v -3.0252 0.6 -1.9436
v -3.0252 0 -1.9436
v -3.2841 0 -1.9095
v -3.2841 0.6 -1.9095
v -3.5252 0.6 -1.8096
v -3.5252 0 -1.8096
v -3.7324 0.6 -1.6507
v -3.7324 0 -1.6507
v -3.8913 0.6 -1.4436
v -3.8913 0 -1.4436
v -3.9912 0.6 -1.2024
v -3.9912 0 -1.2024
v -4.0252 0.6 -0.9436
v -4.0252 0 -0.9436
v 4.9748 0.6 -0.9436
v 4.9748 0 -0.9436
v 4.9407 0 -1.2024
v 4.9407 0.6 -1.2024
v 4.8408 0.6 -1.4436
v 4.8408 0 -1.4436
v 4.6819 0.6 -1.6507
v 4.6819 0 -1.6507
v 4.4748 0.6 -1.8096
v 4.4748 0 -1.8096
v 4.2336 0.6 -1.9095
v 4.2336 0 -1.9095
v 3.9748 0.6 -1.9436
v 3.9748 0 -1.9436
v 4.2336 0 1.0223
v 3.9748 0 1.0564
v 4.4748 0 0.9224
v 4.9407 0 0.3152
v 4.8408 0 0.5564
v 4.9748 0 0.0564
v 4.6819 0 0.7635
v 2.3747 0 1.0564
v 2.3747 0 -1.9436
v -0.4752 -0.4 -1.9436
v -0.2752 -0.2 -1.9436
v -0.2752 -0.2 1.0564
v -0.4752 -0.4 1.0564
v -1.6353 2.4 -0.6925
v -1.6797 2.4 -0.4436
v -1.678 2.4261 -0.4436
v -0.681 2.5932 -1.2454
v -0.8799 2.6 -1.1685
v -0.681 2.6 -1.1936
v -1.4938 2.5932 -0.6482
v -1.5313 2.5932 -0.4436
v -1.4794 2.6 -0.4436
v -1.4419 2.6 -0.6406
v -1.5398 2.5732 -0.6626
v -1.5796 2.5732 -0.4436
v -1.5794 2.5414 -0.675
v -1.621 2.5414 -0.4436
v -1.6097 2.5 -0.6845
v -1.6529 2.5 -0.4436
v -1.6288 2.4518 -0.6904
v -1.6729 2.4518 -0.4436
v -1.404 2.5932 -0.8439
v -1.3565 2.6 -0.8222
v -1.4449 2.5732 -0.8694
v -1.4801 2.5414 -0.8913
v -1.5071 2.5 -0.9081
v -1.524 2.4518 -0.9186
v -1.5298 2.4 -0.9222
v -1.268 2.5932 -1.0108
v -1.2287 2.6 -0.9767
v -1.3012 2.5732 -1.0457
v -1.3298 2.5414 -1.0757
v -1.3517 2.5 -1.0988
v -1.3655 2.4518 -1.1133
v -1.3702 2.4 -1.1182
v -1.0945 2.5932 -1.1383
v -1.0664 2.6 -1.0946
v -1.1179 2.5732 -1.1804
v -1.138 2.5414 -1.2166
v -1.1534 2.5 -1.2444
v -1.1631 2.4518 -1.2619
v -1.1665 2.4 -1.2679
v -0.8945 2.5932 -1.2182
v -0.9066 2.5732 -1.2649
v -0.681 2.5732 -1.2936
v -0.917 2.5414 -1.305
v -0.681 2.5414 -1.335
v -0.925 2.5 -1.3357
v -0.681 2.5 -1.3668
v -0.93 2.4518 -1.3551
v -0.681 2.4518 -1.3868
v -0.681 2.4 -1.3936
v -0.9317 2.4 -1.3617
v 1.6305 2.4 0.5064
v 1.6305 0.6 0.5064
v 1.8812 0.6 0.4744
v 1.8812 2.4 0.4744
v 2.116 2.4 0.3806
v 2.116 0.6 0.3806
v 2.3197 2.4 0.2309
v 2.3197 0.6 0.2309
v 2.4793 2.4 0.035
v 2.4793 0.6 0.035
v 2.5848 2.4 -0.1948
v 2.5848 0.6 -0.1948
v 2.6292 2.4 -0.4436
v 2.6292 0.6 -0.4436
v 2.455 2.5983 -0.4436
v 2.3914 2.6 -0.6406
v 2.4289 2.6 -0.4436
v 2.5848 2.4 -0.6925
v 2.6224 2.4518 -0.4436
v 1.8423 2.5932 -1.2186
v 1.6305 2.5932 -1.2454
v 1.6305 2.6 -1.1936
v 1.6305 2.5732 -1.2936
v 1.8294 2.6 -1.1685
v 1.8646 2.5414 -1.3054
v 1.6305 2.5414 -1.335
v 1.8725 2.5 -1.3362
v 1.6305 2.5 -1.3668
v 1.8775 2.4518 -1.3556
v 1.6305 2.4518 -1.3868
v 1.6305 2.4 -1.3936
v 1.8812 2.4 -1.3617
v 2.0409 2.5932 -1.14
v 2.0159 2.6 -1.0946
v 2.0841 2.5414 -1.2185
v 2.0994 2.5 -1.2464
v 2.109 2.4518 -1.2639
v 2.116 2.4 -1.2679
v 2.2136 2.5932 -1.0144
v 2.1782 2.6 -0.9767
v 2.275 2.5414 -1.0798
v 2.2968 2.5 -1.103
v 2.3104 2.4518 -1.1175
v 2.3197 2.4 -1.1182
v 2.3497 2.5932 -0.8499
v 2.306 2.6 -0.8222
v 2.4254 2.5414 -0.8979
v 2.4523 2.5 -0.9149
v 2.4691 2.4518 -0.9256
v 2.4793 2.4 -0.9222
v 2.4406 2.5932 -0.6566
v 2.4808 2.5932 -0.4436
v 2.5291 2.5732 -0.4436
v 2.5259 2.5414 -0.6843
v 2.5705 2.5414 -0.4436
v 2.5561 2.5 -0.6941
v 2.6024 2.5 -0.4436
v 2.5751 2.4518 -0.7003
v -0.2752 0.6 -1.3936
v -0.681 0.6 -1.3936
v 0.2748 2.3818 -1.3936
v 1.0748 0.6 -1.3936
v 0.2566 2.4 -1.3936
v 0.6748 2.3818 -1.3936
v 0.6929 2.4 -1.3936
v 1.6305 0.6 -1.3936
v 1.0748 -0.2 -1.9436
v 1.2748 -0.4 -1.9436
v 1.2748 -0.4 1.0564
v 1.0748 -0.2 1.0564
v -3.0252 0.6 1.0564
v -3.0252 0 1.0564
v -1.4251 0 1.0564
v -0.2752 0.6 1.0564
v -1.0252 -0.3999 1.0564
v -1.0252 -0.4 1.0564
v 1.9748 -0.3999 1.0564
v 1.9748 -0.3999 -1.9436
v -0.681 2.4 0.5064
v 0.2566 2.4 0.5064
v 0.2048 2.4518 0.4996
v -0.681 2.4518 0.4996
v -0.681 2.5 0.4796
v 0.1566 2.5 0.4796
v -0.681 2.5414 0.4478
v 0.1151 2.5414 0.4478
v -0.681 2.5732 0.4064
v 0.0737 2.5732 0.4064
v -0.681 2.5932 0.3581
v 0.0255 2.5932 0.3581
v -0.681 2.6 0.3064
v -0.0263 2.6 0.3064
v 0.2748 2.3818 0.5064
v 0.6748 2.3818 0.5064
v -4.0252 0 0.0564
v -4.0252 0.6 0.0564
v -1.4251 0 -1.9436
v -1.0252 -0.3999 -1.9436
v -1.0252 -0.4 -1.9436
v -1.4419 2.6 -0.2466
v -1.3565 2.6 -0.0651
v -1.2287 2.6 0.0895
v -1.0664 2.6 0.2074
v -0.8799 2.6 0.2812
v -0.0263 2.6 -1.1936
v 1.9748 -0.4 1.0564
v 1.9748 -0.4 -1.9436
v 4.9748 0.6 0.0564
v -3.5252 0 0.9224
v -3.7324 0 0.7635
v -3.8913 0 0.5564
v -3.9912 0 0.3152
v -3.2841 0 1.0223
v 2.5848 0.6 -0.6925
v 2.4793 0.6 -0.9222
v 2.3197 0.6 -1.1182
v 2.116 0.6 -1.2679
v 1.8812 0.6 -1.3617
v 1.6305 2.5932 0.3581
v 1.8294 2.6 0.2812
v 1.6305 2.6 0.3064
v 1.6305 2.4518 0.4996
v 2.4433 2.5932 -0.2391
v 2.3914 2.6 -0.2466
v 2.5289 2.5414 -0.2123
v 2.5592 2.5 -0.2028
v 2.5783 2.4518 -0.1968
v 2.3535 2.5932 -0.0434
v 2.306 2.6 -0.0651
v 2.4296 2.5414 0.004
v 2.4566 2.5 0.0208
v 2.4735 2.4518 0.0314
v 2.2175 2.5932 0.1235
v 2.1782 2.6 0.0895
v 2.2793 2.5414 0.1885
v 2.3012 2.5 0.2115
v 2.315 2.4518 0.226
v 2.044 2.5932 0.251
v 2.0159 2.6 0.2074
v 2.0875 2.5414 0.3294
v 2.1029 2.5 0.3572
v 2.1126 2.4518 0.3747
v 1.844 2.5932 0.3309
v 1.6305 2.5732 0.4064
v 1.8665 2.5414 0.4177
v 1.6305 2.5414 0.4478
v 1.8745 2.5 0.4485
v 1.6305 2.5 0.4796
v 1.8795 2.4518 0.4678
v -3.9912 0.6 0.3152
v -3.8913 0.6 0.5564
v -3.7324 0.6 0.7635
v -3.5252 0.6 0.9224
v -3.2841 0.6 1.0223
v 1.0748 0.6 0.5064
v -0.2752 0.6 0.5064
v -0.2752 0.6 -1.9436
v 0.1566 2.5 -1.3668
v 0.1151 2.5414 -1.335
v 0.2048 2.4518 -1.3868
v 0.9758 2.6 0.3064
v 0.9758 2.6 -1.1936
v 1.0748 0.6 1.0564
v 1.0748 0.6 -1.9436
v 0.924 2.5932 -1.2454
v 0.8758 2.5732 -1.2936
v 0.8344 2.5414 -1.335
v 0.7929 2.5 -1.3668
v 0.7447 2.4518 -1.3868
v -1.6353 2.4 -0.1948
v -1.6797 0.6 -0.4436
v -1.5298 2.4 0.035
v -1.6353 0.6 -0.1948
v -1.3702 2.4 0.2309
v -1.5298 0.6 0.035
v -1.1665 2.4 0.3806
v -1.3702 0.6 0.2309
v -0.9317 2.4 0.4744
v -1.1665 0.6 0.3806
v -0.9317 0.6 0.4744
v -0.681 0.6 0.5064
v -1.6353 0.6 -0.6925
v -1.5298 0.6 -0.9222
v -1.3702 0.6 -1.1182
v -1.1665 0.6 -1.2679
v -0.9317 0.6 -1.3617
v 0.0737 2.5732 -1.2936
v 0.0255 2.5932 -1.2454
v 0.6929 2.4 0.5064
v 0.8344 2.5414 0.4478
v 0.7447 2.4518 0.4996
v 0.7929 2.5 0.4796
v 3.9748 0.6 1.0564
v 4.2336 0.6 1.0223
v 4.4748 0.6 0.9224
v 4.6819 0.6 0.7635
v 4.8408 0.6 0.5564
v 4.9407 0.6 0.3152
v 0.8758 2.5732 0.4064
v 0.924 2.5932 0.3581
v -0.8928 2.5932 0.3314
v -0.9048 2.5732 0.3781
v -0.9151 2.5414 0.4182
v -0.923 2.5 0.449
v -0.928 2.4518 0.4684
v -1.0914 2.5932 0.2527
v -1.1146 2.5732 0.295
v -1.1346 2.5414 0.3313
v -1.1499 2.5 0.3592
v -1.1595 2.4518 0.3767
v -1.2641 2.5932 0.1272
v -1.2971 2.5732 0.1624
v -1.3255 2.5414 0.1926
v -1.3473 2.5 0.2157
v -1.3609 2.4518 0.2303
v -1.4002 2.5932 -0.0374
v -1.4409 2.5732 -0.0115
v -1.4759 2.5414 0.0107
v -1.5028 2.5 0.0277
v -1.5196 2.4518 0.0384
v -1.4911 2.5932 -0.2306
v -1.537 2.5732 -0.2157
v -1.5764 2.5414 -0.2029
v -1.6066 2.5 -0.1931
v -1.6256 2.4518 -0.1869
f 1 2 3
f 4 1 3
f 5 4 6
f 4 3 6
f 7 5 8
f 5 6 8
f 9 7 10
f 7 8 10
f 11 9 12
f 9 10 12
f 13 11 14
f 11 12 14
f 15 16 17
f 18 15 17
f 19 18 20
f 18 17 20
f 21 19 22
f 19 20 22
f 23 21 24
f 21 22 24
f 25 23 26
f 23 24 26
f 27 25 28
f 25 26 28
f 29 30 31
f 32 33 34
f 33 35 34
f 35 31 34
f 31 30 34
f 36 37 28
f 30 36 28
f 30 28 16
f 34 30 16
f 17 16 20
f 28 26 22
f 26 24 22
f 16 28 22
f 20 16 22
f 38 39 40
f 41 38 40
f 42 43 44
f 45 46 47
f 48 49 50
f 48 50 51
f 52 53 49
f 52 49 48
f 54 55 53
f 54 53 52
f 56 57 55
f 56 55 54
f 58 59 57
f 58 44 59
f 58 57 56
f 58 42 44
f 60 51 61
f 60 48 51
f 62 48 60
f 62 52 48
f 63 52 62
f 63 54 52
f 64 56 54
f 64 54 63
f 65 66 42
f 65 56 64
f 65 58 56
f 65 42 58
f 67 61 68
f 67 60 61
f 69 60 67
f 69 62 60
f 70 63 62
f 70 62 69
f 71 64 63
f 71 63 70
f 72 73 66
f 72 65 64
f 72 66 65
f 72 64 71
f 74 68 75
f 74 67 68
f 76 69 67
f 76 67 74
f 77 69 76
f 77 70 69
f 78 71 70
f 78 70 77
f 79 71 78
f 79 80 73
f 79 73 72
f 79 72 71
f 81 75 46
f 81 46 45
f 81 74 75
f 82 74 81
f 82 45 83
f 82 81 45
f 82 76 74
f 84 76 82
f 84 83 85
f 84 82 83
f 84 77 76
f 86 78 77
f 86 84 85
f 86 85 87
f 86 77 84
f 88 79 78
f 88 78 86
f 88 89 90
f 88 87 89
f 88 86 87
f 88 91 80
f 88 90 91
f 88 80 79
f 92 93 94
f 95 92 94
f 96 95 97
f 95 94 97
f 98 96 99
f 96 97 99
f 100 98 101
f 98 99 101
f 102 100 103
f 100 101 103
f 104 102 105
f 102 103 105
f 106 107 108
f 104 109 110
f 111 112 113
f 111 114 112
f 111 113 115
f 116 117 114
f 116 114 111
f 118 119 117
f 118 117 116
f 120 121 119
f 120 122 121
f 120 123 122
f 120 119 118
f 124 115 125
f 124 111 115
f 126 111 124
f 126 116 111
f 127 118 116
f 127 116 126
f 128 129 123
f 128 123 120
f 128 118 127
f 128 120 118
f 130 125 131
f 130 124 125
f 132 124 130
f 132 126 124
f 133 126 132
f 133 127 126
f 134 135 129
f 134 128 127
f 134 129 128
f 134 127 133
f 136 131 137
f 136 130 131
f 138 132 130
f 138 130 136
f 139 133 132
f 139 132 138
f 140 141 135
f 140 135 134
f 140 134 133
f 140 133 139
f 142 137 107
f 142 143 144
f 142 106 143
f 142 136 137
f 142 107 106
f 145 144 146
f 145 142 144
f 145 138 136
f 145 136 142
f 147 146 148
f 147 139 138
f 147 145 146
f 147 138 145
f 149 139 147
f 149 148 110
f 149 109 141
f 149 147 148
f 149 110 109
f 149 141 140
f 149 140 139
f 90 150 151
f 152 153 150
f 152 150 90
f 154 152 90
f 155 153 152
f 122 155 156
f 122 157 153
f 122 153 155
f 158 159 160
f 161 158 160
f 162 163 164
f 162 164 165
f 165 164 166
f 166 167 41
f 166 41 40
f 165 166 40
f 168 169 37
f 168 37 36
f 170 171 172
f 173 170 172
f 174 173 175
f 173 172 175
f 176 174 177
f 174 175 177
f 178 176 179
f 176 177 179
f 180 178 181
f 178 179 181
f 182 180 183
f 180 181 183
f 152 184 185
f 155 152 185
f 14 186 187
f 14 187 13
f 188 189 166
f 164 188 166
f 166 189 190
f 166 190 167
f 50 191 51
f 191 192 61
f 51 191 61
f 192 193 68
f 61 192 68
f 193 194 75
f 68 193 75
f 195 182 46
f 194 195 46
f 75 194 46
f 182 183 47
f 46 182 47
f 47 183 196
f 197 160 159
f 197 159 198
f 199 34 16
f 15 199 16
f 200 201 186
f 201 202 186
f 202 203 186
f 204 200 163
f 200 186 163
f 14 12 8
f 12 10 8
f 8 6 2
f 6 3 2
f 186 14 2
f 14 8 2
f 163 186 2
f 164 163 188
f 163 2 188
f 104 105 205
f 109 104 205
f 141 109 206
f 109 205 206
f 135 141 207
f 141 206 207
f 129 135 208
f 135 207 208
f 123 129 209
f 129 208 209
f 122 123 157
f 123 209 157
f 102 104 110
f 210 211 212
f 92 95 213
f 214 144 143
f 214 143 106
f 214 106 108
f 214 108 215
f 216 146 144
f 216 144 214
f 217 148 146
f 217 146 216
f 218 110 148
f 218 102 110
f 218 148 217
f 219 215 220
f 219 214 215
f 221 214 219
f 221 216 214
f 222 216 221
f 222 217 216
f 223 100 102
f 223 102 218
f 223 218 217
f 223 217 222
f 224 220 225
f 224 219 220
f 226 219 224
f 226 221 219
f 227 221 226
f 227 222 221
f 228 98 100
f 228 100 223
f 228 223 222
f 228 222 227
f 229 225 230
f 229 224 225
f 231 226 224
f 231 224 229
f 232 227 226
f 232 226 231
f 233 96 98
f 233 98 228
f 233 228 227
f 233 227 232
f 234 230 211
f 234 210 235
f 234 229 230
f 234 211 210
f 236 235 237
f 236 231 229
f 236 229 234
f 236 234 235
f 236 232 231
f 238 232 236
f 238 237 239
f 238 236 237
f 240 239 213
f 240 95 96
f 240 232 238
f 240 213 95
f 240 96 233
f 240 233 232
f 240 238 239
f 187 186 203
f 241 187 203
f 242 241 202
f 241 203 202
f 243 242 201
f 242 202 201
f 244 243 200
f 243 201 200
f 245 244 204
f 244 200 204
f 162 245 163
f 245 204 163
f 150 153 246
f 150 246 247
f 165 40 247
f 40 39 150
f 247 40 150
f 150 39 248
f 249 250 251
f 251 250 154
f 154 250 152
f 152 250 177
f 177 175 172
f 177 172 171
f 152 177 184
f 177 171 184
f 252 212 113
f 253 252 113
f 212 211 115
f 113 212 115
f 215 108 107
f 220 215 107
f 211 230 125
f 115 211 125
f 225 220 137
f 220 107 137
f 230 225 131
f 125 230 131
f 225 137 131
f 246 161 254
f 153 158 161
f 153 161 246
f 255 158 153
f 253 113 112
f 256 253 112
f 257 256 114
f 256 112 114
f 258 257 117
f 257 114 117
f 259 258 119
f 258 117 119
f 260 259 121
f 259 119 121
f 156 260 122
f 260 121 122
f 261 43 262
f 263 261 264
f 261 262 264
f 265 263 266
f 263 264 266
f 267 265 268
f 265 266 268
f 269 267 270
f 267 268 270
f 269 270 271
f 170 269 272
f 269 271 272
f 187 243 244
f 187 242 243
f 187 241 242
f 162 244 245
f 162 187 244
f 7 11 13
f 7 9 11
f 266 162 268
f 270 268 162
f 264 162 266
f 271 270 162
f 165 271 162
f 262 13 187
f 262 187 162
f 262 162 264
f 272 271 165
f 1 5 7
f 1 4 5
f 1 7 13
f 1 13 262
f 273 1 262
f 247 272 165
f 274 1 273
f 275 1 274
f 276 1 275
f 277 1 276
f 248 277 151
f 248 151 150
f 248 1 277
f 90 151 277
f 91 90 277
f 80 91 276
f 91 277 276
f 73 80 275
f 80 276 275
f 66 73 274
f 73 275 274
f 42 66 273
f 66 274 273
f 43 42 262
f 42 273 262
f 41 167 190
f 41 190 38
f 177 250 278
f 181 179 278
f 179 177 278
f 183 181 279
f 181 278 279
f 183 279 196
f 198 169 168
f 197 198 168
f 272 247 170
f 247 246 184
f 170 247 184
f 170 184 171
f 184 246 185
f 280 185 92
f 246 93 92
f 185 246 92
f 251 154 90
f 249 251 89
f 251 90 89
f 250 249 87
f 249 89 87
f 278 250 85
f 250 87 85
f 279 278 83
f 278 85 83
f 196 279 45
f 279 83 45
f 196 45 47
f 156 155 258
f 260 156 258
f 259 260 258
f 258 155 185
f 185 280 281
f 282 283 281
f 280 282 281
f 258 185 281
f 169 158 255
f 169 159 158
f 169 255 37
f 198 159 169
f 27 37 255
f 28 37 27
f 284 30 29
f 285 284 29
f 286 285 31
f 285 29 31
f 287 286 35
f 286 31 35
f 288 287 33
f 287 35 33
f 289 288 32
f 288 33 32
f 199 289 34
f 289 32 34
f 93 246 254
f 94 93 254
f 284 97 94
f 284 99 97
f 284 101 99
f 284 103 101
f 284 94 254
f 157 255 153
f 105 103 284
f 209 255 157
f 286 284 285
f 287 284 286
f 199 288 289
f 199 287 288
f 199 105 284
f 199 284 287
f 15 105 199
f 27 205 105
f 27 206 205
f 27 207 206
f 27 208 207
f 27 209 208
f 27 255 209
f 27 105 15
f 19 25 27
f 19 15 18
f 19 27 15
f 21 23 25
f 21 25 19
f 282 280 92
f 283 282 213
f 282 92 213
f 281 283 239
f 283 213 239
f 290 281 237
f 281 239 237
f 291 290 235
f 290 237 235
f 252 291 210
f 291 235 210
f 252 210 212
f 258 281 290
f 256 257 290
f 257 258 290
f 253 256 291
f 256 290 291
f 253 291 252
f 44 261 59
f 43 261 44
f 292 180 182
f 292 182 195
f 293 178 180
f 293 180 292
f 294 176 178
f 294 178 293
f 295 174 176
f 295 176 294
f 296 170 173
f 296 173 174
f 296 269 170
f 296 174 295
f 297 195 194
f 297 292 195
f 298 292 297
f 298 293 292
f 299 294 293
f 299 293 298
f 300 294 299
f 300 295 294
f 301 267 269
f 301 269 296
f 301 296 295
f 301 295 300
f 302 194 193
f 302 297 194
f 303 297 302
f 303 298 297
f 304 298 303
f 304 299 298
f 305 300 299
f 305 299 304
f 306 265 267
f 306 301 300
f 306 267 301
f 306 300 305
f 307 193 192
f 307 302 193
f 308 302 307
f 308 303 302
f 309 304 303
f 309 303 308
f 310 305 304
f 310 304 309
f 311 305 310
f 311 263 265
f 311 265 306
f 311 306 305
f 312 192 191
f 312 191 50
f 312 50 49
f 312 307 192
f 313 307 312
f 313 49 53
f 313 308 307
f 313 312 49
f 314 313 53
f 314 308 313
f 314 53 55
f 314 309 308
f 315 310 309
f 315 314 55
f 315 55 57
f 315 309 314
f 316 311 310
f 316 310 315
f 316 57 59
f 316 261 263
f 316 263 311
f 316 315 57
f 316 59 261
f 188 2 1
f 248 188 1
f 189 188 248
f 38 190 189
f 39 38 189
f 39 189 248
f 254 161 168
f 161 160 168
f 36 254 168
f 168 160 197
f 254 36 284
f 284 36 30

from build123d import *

# Parameters (mm, degrees)
SKETCH_1_W                      = 9
SKETCH_1_H                      = 3
EXTRUDE_1_DEPTH                 = 0.6
SKETCH_2_W                      = 4.311420348
SKETCH_2_H                      = 1.9
EXTRUDE_2_DEPTH                 = 2
FILLET_1_R                      = 1
SKETCH_3_W                      = 3
SKETCH_3_H                      = 3
EXTRUDE_3_DEPTH                 = 0.4
CHAMFER_1_SIZE                  = 0.4
CUT_EXTRUDE_1_REACH             = 8.365
SKETCH_5_W                      = 1.35
SKETCH_5_H                      = 1
CHAMFER_2_SIZE                  = 0.2
CUT_EXTRUDE_2_REACH             = 8.125
SKETCH_7_W                      = 1
SKETCH_7_H                      = 0.436396564
CUT_EXTRUDE_2_DIRECTION_2_DEPTH = 7.124593071
CHAMFER_3_SIZE                  = 0.3
FILLET_2_R                      = 0.2


# Some blends are built 0.0001 mm under size
with BuildPart() as part:
    # 草图1 → 凸台-拉伸1 (new body)
    with BuildSketch(Plane(origin=(0, 0, 0), x_dir=(1, 0, 0), z_dir=(0, 1, 0))):
        with Locations((0.474750274, 0.443619988)):
            Rectangle(SKETCH_1_W, SKETCH_1_H)
    extrude(amount=EXTRUDE_1_DEPTH)

    # 草图2 → 凸台-拉伸2 (add)
    with BuildSketch(Plane(origin=(0, 0.6, 0), x_dir=(1, 0, 0), z_dir=(0, 1, 0))):
        with Locations((0.474750274, 0.443619988)):
            Rectangle(SKETCH_2_W, SKETCH_2_H)
    extrude(amount=EXTRUDE_2_DEPTH)

    # 圆角1
    # the kernel refuses this fillet: 1 mm, written as the material it takes off along each edge
    with BuildSketch(Plane(origin=(-4.025249726, -2.5, 1.056380012), x_dir=(0, 0, -1), z_dir=(0, 1, 0)), Plane(origin=(-4.025249726, -2.5, -1.943619988), x_dir=(1, 0, 0), z_dir=(0, 1, 0))) as fillet_1_piece_1:
        with BuildLine():
            CenterArc((FILLET_1_R, -FILLET_1_R), FILLET_1_R, 90, 90)
            Line((0, -FILLET_1_R), (0, 0))
            Line((0, 0), (FILLET_1_R, 0))
        make_face()
    extrude(amount=5.6, mode=Mode.SUBTRACT)
    with BuildSketch(Plane(origin=(-1.6809599, 0.6, 0.506380012), x_dir=(1, 0, 0), z_dir=(0, 1, 0)), Plane(origin=(2.630460448, 0.6, 0.506380012), x_dir=(0, 0, -1), z_dir=(0, 1, 0)), Plane(origin=(2.630460448, 0.6, -1.393619988), x_dir=(-1, 0, 0), z_dir=(0, 1, 0))) as fillet_1_piece_2:
        with BuildLine():
            CenterArc((FILLET_1_R, FILLET_1_R), FILLET_1_R, 180, 90)
            Line((0, FILLET_1_R), (0, 0))
            Line((0, 0), (FILLET_1_R, 0))
        make_face()
    extrude(amount=4.5, mode=Mode.SUBTRACT)
    with BuildSketch(Plane(origin=(4.974750274, -2.5, 1.056380012), x_dir=(0, 0, -1), z_dir=(0, 1, 0)), Plane(origin=(4.974750274, -2.5, -1.943619988), x_dir=(-1, 0, 0), z_dir=(0, 1, 0))) as fillet_1_piece_3:
        with BuildLine():
            CenterArc((FILLET_1_R, FILLET_1_R), FILLET_1_R, 180, 90)
            Line((0, FILLET_1_R), (0, 0))
            Line((0, 0), (FILLET_1_R, 0))
        make_face()
    extrude(amount=5.6, mode=Mode.SUBTRACT)
    with BuildSketch(Plane(origin=(-1.6809599, 0.6, -1.393619988), x_dir=(1, 0, 0), z_dir=(0, 1, 0))) as fillet_1_piece_4:
        with BuildLine():
            CenterArc((FILLET_1_R, -FILLET_1_R), FILLET_1_R, 90, 90)
            Line((0, -FILLET_1_R), (0, 0))
            Line((0, 0), (FILLET_1_R, 0))
        make_face()
    extrude(amount=4.5, mode=Mode.SUBTRACT)

    # 草图3 → 凸台-拉伸3 (add)
    with BuildSketch(Plane.XZ):
        with Locations((0.474750274, -0.443619988)):
            Rectangle(SKETCH_3_W, SKETCH_3_H)
    extrude(amount=EXTRUDE_3_DEPTH)

    # 倒角1
    chamfer_1_edges = [part.edges().sort_by_distance(p)[0] for p in [
        (1.974750274, 0, -0.443619988),
        (-1.025249726, 0, -0.443619988),
    ]]
    chamfer(chamfer_1_edges, length=CHAMFER_1_SIZE - 0.0001)  # a hair under: the kernel refuses the full size

    # 草图5 → 切除-拉伸1 (cut, up to next)
    with BuildSketch(Plane(origin=(0, 0, -1.943619988), x_dir=(-1, 0, 0), z_dir=(0, 0, -1)), mode=Mode.PRIVATE) as cut_extrude_1_sk1:
        with Locations((-0.399750274, 0.1)):
            Rectangle(SKETCH_5_W, SKETCH_5_H)
    cut_extrude_1_tool1 = extrude(cut_extrude_1_sk1.sketch, amount=-CUT_EXTRUDE_1_REACH, mode=Mode.PRIVATE) & part.part
    add(cut_extrude_1_tool1.solids().sort_by_distance((0.39975, 0.1, -1.94362))[0], mode=Mode.SUBTRACT)

    # 倒角2
    chamfer_2_edges = [part.edges().sort_by_distance(p)[0] for p in [
        (-0.275249726, -0.4, -0.443619988),
        (1.074750274, -0.4, -0.443619988),
    ]]
    chamfer(chamfer_2_edges, length=CHAMFER_2_SIZE)

    # 草图7 → 切除-拉伸2 (cut, up to next)
    with BuildSketch(Plane.XY.offset(0.506380012), mode=Mode.PRIVATE) as cut_extrude_2_sk1:
        with Locations((0.474750274, 2.6)):
            Rectangle(SKETCH_7_W, SKETCH_7_H)
    cut_extrude_2_tool1 = extrude(cut_extrude_2_sk1.sketch, amount=-CUT_EXTRUDE_2_REACH, mode=Mode.PRIVATE) & part.part
    add(cut_extrude_2_tool1.solids().sort_by_distance((0.47475, 2.6, 0.50638))[0], mode=Mode.SUBTRACT)

    # 草图7 → 切除-拉伸2 direction 2 (cut)
    with BuildSketch(Plane.XY.offset(0.506380012)):
        with Locations((0.474750274, 2.6)):
            Rectangle(SKETCH_7_W, SKETCH_7_H)
    extrude(amount=CUT_EXTRUDE_2_DIRECTION_2_DEPTH, mode=Mode.SUBTRACT)

    # 倒角3
    # the kernel refuses this chamfer: 0.3 mm, written as the material it adds along each edge
    with BuildSketch(Plane(origin=(0.974750274, 2.381801718, 0.506380012), x_dir=(-0.9996219169112968, -0.027495876610585914, 0), z_dir=(0, 0, -1))) as chamfer_3_piece_1_section:
        Polygon((CHAMFER_3_SIZE * 0.999621916911, CHAMFER_3_SIZE * 0.0274958766106), (-CHAMFER_3_SIZE * 0.0274958766106, CHAMFER_3_SIZE * 0.999621916911), (0, 0), align=None)
    chamfer_3_piece_1 = extrude(amount=1.9, mode=Mode.PRIVATE)
    chamfer_3_piece_1 = split(chamfer_3_piece_1, bisect_by=Plane(origin=(0.868236274, 2.6, -0.443619988), z_dir=(0, -1, 0)), keep=Keep.TOP, mode=Mode.PRIVATE)
    add(chamfer_3_piece_1)
    with BuildSketch(Plane(origin=(-0.025249726, 2.381801718, 0.506380012), x_dir=(-0.027495876610586414, 0.9996219169112968, 0), z_dir=(0, 0, -1))) as chamfer_3_piece_2_section:
        Polygon((CHAMFER_3_SIZE * 0.999621916911, CHAMFER_3_SIZE * 0.0274958766106), (-CHAMFER_3_SIZE * 0.0274958766106, CHAMFER_3_SIZE * 0.999621916911), (0, 0), align=None)
    chamfer_3_piece_2 = extrude(amount=1.9, mode=Mode.PRIVATE)
    chamfer_3_piece_2 = split(chamfer_3_piece_2, bisect_by=Plane(origin=(0.081264274, 2.6, -0.443619988), z_dir=(0, -1, 0)), keep=Keep.TOP, mode=Mode.PRIVATE)
    add(chamfer_3_piece_2)

    # 圆角2
    # the kernel refuses this fillet: 0.2 mm, written as the material it takes off along each edge
    with BuildSketch(Plane(origin=(1.630460448, 2.6, 0.506380012), x_dir=(0, 0, -1), z_dir=(-1, 0, 0)), Plane(origin=(-0.6809599, 2.6, -1.393619988), x_dir=(0, 0, 1), z_dir=(1, 0, 0)), Plane(origin=(0.556551992, 2.6, 0.506380012), x_dir=(0, 0, -1), z_dir=(-1, 0, 0))) as fillet_2_piece_1:
        with BuildLine():
            CenterArc((FILLET_2_R, FILLET_2_R), FILLET_2_R, 180, 90)
            Line((0, FILLET_2_R), (0, 0))
            Line((0, 0), (FILLET_2_R, 0))
        make_face()
    extrude(amount=1.237511893, mode=Mode.SUBTRACT)
    with BuildSketch(Plane(origin=(0.892948555, 2.6, 0.713486793), x_dir=(1, 0, 0), z_dir=(0, 0, -1))) as fillet_2_piece_2:
        with BuildLine():
            CenterArc((FILLET_2_R * 0.414213562373, FILLET_2_R), FILLET_2_R, 225, 45)
            Line((-FILLET_2_R * 0.292893218814, FILLET_2_R * 0.292893218814), (0, 0))
            Line((0, 0), (FILLET_2_R * 0.414213562373, 0))
        make_face()
    extrude(amount=2.314213562, mode=Mode.SUBTRACT)
    with BuildSketch(Plane(origin=(0.056551992, 2.6, -1.60072677), x_dir=(0.7071067811868288, -0.7071067811862661, 0), z_dir=(0, 0, 1))) as fillet_2_piece_3:
        with BuildLine():
            CenterArc((FILLET_2_R * 0.414213562373, -FILLET_2_R), FILLET_2_R, 90, 45)
            Line((-FILLET_2_R * 0.292893218813, -FILLET_2_R * 0.292893218813), (0, 0))
            Line((0, 0), (FILLET_2_R * 0.414213562373, 0))
        make_face()
    extrude(amount=2.314213562, mode=Mode.SUBTRACT)
    with BuildSketch(Plane(origin=(1.630460448, 2.6, -1.393619988), x_dir=(0, 0, 1), z_dir=(-1, 0, 0))) as fillet_2_piece_4:
        with BuildLine():
            CenterArc((FILLET_2_R, -FILLET_2_R), FILLET_2_R, 90, 90)
            Line((0, -FILLET_2_R), (0, 0))
            Line((0, 0), (FILLET_2_R, 0))
        make_face()
    extrude(amount=1.237511893, mode=Mode.SUBTRACT)
    with BuildSketch(Plane(origin=(1.630460448, 2.6, -0.393619988), x_dir=(0, 0, -1), z_dir=(-1, 0, 0))) as fillet_2_piece_5:
        with BuildLine():
            CenterArc((1 - FILLET_2_R, FILLET_2_R), FILLET_2_R, 270, 90)
            Line((1, FILLET_2_R), (1, 0))
            Line((1, 0), (1 - FILLET_2_R, 0))
        make_face()
    revolve(axis=Axis((1.630460448, 2.6, -0.393619988), (0, -1, 0)), revolution_arc=115.792692411, mode=Mode.SUBTRACT)
    with BuildSketch(Plane(origin=(1.630460448, 2.6, -0.493619988), x_dir=(0.9003742740999041, 0, -0.4351162678400692), z_dir=(-0.4351162678400692, 0, -0.9003742740999041))) as fillet_2_piece_6:
        with BuildLine():
            CenterArc((1 - FILLET_2_R, FILLET_2_R), FILLET_2_R, 270, 90)
            Line((1 - FILLET_2_R, 0), (1, 0))
            Line((1, 0), (1, FILLET_2_R))
        make_face()
    revolve(axis=Axis((1.630460448, 2.6, -0.493619988), (0, -1, 0)), revolution_arc=115.792692411, mode=Mode.SUBTRACT)
    with BuildSketch(Plane(origin=(-0.6809599, 2.6, -0.393619988), x_dir=(-0.9003742740999052, 0, 0.43511626784006674), z_dir=(0.43511626784006674, 0, 0.9003742740999052))) as fillet_2_piece_7:
        with BuildLine():
            CenterArc((1 - FILLET_2_R, FILLET_2_R), FILLET_2_R, 270, 90)
            Line((1, FILLET_2_R), (1, 0))
            Line((1, 0), (1 - FILLET_2_R, 0))
        make_face()
    revolve(axis=Axis((-0.6809599, 2.6, -0.393619988), (0, -1, 0)), revolution_arc=115.792692411, mode=Mode.SUBTRACT)
    with BuildSketch(Plane(origin=(-0.6809599, 2.6, -0.493619988), x_dir=(0, 0, 1), z_dir=(1, 0, 0))) as fillet_2_piece_8:
        with BuildLine():
            CenterArc((1 - FILLET_2_R, FILLET_2_R), FILLET_2_R, 270, 90)
            Line((1, FILLET_2_R), (1, 0))
            Line((1, 0), (1 - FILLET_2_R, 0))
        make_face()
    revolve(axis=Axis((-0.6809599, 2.6, -0.493619988), (0, -1, 0)), revolution_arc=115.792692411, mode=Mode.SUBTRACT)


solid = part.part
